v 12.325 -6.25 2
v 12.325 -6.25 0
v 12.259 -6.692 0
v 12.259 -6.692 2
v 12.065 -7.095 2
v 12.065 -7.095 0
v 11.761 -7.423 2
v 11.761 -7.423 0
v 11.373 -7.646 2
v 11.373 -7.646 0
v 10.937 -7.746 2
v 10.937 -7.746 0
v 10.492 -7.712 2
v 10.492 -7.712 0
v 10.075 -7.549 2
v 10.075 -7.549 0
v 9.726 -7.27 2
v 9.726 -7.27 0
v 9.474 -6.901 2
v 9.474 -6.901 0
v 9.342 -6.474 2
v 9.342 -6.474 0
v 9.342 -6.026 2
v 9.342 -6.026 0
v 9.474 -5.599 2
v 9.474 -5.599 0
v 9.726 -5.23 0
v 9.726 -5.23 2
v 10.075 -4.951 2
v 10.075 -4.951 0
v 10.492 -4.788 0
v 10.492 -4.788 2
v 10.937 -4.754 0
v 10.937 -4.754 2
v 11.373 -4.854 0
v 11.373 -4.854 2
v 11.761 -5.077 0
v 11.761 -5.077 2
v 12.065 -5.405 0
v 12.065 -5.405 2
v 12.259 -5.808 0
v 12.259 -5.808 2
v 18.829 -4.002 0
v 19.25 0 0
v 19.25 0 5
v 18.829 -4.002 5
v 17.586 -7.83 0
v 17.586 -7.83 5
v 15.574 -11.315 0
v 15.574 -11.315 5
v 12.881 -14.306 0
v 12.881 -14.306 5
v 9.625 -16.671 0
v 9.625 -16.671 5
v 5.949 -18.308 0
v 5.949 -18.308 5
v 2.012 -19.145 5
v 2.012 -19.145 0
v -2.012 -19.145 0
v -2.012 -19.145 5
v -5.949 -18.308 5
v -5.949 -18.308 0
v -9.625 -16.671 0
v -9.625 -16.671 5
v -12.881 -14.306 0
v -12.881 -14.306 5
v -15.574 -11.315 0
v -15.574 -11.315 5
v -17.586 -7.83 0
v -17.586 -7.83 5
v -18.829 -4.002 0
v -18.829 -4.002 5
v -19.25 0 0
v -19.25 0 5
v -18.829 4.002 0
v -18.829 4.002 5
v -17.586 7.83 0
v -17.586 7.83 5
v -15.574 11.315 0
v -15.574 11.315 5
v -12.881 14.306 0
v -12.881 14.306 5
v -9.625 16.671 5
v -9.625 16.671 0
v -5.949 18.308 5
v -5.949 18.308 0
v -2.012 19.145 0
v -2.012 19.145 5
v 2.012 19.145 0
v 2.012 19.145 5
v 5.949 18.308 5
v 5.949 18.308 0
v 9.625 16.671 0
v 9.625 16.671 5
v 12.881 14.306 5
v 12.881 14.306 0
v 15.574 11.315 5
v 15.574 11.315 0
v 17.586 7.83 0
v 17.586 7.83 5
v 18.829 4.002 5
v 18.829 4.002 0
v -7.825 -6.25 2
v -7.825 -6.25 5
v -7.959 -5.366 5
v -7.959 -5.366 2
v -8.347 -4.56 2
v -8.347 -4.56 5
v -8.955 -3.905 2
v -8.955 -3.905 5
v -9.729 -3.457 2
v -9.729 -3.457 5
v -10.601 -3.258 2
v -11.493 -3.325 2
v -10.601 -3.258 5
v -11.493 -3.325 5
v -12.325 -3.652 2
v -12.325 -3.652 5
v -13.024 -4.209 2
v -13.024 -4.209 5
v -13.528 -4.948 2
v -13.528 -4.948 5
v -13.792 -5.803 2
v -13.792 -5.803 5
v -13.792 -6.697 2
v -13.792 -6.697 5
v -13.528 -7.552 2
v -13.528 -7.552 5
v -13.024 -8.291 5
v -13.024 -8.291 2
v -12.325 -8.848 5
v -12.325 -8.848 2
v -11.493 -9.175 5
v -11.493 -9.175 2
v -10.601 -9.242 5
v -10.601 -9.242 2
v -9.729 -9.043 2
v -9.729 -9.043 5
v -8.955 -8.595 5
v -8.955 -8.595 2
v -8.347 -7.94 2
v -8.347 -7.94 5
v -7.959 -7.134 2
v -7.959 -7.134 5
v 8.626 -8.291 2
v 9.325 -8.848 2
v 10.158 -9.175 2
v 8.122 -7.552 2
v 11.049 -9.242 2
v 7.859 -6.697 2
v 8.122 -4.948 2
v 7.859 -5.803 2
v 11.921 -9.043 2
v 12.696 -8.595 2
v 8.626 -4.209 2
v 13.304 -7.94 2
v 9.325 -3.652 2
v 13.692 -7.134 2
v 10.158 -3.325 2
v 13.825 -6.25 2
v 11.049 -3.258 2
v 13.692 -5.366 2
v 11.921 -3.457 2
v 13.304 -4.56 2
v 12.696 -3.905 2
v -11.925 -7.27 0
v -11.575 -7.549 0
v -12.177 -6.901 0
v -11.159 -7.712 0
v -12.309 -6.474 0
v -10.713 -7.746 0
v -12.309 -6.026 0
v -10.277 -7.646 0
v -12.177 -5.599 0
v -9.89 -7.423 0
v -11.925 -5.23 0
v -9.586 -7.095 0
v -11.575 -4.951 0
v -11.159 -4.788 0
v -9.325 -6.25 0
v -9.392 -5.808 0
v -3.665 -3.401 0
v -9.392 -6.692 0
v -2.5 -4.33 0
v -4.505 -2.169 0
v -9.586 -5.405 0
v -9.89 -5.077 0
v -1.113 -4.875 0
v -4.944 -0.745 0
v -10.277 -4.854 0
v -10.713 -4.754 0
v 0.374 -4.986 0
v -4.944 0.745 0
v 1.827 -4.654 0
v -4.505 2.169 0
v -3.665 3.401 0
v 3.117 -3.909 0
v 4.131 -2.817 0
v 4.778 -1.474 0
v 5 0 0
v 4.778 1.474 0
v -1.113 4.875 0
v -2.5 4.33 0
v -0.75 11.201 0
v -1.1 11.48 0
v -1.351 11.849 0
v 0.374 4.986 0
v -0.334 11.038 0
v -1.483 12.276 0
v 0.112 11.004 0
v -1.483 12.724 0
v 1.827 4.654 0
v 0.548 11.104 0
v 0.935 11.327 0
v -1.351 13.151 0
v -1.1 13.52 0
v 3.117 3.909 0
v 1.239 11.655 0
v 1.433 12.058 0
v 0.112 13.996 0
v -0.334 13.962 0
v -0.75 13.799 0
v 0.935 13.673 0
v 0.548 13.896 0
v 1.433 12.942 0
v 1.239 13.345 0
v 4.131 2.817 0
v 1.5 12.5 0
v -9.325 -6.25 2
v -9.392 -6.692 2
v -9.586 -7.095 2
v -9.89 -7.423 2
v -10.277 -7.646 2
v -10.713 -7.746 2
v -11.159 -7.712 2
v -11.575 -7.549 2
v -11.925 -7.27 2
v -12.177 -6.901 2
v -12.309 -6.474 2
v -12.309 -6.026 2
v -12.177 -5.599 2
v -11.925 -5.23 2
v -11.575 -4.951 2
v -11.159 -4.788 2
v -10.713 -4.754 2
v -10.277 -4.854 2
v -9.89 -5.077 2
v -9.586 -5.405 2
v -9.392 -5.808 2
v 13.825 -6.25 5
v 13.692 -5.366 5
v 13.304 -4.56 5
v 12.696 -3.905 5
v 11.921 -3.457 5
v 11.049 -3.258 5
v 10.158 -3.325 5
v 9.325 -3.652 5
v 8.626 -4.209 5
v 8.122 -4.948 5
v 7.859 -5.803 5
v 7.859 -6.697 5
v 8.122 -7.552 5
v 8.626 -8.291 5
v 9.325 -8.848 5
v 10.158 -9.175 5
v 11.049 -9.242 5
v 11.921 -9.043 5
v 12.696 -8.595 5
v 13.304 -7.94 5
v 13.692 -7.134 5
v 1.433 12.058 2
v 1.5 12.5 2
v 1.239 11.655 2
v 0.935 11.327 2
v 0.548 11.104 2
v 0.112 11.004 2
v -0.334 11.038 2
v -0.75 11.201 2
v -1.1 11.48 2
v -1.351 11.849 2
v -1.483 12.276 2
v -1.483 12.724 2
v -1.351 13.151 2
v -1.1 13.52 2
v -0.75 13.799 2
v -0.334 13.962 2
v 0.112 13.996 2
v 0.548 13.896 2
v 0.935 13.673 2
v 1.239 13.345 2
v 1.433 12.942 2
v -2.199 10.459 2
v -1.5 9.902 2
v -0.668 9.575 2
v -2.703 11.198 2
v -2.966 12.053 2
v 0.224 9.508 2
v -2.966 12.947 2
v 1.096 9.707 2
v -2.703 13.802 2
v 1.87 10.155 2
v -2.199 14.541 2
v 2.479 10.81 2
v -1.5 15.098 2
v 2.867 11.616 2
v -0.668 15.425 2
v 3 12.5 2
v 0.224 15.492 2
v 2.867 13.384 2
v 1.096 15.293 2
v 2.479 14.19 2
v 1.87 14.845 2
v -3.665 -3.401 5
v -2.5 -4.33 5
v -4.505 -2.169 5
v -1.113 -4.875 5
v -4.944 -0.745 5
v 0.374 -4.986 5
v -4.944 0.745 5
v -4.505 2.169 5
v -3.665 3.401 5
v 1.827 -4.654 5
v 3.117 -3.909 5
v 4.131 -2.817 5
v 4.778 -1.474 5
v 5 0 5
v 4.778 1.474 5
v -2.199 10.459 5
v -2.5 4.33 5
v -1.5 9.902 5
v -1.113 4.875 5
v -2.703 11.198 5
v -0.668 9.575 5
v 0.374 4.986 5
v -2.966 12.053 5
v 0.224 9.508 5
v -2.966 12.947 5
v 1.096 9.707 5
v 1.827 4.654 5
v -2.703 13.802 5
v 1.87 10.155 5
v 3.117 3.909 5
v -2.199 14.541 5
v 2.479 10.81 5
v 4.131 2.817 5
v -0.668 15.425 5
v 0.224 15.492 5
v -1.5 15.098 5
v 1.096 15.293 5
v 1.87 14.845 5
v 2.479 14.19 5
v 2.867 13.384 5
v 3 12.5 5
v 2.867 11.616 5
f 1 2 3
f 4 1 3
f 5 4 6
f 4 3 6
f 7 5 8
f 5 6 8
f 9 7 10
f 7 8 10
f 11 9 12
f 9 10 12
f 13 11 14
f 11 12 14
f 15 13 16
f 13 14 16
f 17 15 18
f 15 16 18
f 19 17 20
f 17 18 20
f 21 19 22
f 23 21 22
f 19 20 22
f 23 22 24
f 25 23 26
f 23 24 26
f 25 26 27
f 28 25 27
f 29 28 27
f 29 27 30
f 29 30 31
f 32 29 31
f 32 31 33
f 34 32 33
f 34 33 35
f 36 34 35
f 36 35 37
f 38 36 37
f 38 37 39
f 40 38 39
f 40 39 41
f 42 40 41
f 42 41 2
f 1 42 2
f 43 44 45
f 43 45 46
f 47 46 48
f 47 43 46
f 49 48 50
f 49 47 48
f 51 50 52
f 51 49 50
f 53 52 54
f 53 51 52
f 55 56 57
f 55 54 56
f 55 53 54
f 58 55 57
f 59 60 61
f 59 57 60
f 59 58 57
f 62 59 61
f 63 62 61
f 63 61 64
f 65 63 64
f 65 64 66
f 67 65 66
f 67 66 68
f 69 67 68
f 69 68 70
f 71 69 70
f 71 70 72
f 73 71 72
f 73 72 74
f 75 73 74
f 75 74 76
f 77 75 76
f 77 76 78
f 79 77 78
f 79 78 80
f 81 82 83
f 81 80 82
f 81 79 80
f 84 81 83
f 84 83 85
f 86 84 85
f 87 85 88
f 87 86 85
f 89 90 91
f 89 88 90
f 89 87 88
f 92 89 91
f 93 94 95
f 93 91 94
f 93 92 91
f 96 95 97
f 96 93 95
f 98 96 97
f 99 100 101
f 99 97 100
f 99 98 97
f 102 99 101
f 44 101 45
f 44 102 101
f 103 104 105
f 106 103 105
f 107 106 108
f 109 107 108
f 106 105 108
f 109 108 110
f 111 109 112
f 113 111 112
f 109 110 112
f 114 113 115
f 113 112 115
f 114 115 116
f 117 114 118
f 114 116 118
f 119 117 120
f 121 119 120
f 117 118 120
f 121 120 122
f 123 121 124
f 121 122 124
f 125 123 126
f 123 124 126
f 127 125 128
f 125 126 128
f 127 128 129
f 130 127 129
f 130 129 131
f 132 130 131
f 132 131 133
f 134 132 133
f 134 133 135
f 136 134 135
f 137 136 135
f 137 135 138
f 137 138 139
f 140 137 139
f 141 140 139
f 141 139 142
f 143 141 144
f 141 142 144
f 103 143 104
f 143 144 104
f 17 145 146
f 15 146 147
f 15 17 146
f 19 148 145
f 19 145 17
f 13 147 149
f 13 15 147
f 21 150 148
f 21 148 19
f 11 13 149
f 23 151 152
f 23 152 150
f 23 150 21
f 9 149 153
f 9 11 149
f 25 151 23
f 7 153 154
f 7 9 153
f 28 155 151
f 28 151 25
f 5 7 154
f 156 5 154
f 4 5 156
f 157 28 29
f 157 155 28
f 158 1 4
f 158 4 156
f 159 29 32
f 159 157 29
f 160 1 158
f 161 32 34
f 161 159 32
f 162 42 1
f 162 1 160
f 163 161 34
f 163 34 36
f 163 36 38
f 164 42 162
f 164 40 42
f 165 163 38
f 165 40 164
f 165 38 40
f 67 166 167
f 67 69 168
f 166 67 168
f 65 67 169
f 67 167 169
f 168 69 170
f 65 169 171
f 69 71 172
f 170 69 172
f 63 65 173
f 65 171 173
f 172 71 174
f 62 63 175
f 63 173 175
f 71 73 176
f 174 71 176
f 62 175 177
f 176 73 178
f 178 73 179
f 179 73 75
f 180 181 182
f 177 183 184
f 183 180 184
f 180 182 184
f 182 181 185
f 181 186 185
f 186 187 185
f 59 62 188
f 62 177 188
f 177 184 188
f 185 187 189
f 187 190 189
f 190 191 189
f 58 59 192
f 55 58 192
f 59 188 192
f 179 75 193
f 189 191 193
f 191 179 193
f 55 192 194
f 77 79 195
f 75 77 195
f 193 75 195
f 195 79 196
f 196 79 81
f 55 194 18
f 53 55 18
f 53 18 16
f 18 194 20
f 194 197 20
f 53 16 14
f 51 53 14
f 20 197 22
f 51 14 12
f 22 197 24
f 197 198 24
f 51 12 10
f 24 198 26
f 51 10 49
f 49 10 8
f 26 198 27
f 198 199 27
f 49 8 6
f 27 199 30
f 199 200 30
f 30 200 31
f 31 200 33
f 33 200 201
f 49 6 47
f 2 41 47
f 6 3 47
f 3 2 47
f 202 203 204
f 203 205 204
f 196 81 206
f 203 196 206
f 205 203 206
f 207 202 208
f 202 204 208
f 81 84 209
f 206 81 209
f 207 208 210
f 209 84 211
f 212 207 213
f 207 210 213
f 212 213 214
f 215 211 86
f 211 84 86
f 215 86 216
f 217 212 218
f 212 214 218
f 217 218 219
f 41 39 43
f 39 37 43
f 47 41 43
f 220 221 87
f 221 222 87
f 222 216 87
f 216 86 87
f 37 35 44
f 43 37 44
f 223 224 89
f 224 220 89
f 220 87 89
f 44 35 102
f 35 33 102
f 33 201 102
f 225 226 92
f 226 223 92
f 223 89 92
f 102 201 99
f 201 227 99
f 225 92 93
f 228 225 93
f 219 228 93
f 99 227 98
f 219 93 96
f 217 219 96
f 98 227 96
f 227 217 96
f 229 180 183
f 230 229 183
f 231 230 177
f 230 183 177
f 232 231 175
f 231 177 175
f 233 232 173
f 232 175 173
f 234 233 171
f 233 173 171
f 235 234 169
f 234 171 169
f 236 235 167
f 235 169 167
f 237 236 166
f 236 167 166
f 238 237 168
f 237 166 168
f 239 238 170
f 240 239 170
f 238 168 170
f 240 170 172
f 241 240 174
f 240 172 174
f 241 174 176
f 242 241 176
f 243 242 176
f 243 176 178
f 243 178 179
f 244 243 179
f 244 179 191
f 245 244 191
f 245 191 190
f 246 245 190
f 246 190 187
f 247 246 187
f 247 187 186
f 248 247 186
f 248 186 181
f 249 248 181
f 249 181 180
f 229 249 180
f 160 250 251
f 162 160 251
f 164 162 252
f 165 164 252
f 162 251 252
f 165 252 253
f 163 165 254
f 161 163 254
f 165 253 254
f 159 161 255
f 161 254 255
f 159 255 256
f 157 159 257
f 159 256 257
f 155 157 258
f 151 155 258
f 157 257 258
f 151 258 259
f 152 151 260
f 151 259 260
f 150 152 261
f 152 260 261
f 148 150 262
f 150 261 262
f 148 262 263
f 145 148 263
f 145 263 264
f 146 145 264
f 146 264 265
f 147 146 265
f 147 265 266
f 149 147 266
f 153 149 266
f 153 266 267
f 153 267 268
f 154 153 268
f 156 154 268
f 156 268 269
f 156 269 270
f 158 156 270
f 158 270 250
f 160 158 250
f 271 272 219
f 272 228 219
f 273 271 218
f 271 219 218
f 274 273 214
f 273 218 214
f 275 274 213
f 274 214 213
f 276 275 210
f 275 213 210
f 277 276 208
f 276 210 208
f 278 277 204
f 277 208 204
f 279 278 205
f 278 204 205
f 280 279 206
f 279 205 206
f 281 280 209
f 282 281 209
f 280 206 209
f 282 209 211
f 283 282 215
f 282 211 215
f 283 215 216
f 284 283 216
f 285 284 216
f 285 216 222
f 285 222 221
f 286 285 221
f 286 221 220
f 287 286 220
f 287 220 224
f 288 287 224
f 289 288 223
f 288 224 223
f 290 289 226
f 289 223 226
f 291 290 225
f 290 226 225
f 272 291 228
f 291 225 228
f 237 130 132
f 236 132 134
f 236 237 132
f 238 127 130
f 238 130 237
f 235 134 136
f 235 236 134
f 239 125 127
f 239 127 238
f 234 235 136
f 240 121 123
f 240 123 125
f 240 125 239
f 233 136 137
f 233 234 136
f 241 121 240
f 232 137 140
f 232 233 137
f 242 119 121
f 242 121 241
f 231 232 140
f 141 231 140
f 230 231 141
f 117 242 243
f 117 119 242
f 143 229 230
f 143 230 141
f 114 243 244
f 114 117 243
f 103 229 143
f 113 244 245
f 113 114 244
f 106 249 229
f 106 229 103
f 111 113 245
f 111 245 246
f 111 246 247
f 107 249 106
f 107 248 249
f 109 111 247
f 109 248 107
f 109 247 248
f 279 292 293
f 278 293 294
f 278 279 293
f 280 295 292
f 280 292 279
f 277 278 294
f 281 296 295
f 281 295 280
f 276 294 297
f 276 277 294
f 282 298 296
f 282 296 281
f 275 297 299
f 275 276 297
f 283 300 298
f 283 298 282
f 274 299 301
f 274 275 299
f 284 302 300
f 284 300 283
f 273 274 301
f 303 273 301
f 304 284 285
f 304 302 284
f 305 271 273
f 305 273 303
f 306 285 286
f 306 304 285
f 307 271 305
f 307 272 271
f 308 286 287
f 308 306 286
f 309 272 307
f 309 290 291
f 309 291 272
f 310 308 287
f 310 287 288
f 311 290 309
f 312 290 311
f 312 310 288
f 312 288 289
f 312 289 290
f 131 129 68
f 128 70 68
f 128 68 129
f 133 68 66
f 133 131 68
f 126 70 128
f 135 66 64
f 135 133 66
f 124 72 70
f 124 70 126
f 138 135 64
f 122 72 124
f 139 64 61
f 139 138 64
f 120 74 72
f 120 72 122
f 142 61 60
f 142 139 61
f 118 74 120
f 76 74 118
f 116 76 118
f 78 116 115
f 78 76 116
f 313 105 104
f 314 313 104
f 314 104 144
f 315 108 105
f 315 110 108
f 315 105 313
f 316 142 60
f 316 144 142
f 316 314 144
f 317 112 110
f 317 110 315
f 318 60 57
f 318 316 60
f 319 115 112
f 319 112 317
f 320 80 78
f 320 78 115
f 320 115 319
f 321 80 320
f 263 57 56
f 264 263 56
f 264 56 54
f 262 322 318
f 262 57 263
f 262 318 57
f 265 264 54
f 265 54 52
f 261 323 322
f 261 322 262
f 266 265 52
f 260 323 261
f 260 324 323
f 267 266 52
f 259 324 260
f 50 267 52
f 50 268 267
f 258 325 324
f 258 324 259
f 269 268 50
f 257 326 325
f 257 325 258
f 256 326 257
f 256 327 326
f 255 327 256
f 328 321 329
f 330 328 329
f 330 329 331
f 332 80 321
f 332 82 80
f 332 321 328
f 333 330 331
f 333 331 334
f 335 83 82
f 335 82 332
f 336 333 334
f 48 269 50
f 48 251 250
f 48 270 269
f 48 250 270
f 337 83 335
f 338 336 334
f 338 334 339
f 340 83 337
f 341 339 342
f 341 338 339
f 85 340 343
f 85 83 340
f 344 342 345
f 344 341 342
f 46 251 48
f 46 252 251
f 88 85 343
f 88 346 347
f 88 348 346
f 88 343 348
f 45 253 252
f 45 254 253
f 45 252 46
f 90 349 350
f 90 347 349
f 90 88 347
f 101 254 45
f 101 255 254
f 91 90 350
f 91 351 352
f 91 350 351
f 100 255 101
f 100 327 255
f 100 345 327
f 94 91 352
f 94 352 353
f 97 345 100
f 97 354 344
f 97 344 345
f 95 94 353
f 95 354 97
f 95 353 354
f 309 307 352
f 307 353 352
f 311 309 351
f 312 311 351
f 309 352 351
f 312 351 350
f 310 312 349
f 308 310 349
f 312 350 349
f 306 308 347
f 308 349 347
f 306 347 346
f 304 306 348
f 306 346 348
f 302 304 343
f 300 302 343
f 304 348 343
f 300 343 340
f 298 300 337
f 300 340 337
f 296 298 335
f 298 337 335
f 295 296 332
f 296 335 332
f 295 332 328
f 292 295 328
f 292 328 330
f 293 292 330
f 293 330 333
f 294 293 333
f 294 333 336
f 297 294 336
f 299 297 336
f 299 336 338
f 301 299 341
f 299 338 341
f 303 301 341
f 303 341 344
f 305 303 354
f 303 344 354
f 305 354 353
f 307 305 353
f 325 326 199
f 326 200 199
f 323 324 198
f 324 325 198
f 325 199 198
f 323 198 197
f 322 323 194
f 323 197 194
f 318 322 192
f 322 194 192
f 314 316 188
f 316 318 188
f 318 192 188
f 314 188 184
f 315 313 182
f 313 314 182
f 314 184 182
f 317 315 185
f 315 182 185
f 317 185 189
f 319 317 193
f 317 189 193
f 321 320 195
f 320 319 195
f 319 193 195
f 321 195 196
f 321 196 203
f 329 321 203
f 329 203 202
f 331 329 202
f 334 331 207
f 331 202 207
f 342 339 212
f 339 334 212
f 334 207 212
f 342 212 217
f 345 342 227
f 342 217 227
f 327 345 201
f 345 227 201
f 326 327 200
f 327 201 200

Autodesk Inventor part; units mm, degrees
ref_plane "YZ Plane" through (0, 0, 0) normal (1, 0, 0) x (0, 1, 0)
ref_plane "XZ Plane" through (0, 0, 0) normal (0, 1, 0) x (-1, 0, 0)
ref_plane "XY Plane" through (0, 0, 0) normal (0, 0, 1) x (1, 0, 0)
sketch "Sketch1" plane through (0, 0, 0) normal (0, 0, 1) x (1, 0, 0)
  circle A0 centre (0, 0) radius 19.25
  circle A1 centre (0, 12.5) radius 1.5
  circle A2 centre (-10.8253, -6.25) radius 1.5
  circle A3 centre (10.8253, -6.25) radius 1.5
  circle A4 centre (0, 0) radius 5
  dimension "d0" = 38.5
  dimension "d1" = 3
  dimension "d4" = 360
  dimension "d6" = 12.5
  dimension "d7" = 10
extrude "Extrusion1" add sketch "Sketch1" along normal blind 5
sketch "Sketch2" plane through (0, 0, 5) normal (0, 0, 1) x (1, 0, 0)
  circle A0 centre (0, 12.5) radius 1.5 projected
  circle A1 centre (10.8253, -6.25) radius 1.5 projected
  circle A2 centre (-10.8253, -6.25) radius 1.5 projected
  circle A3 centre (0, 12.5) radius 3
  circle A4 centre (10.8253, -6.25) radius 1.5 projected
  circle A5 centre (10.8253, -6.25) radius 3
  circle A6 centre (-10.8253, -6.25) radius 3
  point P0 (0, 0)
  dimension "d10" = 6
  dimension "d11" = 6
  dimension "d12" = 6
extrude "Extrusion2" cut sketch "Sketch2" against normal blind 3 contours A0 | A1 | A2 | A3 | A5 | A6
properties part number "SJ018" material "ABS Plastic"
